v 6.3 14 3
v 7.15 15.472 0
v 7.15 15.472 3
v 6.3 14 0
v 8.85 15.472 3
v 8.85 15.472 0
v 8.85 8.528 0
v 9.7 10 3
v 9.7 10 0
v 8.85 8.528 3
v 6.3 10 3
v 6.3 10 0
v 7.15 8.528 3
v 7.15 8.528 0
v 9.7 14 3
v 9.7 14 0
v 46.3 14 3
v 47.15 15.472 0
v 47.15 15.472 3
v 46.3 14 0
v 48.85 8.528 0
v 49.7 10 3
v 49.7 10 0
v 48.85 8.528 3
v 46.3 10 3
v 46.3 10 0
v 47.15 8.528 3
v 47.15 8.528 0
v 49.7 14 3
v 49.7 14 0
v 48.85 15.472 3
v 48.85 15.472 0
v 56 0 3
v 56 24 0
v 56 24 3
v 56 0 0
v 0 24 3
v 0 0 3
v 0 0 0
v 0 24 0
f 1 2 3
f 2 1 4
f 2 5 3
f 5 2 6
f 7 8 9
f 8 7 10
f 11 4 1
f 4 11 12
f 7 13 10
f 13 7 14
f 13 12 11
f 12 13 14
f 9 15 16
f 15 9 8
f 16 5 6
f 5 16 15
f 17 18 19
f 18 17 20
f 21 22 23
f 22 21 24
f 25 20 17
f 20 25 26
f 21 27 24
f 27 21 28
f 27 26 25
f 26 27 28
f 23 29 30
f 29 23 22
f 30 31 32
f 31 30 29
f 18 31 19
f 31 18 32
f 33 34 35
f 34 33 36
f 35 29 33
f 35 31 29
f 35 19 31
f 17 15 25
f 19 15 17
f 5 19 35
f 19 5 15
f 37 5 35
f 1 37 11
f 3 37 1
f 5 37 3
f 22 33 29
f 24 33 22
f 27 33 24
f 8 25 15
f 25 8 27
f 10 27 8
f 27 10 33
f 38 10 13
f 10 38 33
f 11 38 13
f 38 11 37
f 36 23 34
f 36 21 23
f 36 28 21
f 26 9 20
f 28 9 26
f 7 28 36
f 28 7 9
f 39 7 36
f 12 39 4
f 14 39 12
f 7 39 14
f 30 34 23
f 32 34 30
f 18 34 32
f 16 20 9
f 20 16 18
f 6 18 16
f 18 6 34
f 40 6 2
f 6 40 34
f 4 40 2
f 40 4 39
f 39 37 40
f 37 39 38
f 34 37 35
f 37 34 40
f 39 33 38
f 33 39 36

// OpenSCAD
// Cap fit coupon — 40mm o/c slots, rotate 90° to test both orientations
difference() {
    cube([56, 24, 3]);
    for (sx = [-20, 20])
        translate([sx + 28, 12, -1]) hull() {
            translate([0, -2, 0]) cylinder(d = 3.4, h = 5);
            translate([0,  2, 0]) cylinder(d = 3.4, h = 5);
        }
}
